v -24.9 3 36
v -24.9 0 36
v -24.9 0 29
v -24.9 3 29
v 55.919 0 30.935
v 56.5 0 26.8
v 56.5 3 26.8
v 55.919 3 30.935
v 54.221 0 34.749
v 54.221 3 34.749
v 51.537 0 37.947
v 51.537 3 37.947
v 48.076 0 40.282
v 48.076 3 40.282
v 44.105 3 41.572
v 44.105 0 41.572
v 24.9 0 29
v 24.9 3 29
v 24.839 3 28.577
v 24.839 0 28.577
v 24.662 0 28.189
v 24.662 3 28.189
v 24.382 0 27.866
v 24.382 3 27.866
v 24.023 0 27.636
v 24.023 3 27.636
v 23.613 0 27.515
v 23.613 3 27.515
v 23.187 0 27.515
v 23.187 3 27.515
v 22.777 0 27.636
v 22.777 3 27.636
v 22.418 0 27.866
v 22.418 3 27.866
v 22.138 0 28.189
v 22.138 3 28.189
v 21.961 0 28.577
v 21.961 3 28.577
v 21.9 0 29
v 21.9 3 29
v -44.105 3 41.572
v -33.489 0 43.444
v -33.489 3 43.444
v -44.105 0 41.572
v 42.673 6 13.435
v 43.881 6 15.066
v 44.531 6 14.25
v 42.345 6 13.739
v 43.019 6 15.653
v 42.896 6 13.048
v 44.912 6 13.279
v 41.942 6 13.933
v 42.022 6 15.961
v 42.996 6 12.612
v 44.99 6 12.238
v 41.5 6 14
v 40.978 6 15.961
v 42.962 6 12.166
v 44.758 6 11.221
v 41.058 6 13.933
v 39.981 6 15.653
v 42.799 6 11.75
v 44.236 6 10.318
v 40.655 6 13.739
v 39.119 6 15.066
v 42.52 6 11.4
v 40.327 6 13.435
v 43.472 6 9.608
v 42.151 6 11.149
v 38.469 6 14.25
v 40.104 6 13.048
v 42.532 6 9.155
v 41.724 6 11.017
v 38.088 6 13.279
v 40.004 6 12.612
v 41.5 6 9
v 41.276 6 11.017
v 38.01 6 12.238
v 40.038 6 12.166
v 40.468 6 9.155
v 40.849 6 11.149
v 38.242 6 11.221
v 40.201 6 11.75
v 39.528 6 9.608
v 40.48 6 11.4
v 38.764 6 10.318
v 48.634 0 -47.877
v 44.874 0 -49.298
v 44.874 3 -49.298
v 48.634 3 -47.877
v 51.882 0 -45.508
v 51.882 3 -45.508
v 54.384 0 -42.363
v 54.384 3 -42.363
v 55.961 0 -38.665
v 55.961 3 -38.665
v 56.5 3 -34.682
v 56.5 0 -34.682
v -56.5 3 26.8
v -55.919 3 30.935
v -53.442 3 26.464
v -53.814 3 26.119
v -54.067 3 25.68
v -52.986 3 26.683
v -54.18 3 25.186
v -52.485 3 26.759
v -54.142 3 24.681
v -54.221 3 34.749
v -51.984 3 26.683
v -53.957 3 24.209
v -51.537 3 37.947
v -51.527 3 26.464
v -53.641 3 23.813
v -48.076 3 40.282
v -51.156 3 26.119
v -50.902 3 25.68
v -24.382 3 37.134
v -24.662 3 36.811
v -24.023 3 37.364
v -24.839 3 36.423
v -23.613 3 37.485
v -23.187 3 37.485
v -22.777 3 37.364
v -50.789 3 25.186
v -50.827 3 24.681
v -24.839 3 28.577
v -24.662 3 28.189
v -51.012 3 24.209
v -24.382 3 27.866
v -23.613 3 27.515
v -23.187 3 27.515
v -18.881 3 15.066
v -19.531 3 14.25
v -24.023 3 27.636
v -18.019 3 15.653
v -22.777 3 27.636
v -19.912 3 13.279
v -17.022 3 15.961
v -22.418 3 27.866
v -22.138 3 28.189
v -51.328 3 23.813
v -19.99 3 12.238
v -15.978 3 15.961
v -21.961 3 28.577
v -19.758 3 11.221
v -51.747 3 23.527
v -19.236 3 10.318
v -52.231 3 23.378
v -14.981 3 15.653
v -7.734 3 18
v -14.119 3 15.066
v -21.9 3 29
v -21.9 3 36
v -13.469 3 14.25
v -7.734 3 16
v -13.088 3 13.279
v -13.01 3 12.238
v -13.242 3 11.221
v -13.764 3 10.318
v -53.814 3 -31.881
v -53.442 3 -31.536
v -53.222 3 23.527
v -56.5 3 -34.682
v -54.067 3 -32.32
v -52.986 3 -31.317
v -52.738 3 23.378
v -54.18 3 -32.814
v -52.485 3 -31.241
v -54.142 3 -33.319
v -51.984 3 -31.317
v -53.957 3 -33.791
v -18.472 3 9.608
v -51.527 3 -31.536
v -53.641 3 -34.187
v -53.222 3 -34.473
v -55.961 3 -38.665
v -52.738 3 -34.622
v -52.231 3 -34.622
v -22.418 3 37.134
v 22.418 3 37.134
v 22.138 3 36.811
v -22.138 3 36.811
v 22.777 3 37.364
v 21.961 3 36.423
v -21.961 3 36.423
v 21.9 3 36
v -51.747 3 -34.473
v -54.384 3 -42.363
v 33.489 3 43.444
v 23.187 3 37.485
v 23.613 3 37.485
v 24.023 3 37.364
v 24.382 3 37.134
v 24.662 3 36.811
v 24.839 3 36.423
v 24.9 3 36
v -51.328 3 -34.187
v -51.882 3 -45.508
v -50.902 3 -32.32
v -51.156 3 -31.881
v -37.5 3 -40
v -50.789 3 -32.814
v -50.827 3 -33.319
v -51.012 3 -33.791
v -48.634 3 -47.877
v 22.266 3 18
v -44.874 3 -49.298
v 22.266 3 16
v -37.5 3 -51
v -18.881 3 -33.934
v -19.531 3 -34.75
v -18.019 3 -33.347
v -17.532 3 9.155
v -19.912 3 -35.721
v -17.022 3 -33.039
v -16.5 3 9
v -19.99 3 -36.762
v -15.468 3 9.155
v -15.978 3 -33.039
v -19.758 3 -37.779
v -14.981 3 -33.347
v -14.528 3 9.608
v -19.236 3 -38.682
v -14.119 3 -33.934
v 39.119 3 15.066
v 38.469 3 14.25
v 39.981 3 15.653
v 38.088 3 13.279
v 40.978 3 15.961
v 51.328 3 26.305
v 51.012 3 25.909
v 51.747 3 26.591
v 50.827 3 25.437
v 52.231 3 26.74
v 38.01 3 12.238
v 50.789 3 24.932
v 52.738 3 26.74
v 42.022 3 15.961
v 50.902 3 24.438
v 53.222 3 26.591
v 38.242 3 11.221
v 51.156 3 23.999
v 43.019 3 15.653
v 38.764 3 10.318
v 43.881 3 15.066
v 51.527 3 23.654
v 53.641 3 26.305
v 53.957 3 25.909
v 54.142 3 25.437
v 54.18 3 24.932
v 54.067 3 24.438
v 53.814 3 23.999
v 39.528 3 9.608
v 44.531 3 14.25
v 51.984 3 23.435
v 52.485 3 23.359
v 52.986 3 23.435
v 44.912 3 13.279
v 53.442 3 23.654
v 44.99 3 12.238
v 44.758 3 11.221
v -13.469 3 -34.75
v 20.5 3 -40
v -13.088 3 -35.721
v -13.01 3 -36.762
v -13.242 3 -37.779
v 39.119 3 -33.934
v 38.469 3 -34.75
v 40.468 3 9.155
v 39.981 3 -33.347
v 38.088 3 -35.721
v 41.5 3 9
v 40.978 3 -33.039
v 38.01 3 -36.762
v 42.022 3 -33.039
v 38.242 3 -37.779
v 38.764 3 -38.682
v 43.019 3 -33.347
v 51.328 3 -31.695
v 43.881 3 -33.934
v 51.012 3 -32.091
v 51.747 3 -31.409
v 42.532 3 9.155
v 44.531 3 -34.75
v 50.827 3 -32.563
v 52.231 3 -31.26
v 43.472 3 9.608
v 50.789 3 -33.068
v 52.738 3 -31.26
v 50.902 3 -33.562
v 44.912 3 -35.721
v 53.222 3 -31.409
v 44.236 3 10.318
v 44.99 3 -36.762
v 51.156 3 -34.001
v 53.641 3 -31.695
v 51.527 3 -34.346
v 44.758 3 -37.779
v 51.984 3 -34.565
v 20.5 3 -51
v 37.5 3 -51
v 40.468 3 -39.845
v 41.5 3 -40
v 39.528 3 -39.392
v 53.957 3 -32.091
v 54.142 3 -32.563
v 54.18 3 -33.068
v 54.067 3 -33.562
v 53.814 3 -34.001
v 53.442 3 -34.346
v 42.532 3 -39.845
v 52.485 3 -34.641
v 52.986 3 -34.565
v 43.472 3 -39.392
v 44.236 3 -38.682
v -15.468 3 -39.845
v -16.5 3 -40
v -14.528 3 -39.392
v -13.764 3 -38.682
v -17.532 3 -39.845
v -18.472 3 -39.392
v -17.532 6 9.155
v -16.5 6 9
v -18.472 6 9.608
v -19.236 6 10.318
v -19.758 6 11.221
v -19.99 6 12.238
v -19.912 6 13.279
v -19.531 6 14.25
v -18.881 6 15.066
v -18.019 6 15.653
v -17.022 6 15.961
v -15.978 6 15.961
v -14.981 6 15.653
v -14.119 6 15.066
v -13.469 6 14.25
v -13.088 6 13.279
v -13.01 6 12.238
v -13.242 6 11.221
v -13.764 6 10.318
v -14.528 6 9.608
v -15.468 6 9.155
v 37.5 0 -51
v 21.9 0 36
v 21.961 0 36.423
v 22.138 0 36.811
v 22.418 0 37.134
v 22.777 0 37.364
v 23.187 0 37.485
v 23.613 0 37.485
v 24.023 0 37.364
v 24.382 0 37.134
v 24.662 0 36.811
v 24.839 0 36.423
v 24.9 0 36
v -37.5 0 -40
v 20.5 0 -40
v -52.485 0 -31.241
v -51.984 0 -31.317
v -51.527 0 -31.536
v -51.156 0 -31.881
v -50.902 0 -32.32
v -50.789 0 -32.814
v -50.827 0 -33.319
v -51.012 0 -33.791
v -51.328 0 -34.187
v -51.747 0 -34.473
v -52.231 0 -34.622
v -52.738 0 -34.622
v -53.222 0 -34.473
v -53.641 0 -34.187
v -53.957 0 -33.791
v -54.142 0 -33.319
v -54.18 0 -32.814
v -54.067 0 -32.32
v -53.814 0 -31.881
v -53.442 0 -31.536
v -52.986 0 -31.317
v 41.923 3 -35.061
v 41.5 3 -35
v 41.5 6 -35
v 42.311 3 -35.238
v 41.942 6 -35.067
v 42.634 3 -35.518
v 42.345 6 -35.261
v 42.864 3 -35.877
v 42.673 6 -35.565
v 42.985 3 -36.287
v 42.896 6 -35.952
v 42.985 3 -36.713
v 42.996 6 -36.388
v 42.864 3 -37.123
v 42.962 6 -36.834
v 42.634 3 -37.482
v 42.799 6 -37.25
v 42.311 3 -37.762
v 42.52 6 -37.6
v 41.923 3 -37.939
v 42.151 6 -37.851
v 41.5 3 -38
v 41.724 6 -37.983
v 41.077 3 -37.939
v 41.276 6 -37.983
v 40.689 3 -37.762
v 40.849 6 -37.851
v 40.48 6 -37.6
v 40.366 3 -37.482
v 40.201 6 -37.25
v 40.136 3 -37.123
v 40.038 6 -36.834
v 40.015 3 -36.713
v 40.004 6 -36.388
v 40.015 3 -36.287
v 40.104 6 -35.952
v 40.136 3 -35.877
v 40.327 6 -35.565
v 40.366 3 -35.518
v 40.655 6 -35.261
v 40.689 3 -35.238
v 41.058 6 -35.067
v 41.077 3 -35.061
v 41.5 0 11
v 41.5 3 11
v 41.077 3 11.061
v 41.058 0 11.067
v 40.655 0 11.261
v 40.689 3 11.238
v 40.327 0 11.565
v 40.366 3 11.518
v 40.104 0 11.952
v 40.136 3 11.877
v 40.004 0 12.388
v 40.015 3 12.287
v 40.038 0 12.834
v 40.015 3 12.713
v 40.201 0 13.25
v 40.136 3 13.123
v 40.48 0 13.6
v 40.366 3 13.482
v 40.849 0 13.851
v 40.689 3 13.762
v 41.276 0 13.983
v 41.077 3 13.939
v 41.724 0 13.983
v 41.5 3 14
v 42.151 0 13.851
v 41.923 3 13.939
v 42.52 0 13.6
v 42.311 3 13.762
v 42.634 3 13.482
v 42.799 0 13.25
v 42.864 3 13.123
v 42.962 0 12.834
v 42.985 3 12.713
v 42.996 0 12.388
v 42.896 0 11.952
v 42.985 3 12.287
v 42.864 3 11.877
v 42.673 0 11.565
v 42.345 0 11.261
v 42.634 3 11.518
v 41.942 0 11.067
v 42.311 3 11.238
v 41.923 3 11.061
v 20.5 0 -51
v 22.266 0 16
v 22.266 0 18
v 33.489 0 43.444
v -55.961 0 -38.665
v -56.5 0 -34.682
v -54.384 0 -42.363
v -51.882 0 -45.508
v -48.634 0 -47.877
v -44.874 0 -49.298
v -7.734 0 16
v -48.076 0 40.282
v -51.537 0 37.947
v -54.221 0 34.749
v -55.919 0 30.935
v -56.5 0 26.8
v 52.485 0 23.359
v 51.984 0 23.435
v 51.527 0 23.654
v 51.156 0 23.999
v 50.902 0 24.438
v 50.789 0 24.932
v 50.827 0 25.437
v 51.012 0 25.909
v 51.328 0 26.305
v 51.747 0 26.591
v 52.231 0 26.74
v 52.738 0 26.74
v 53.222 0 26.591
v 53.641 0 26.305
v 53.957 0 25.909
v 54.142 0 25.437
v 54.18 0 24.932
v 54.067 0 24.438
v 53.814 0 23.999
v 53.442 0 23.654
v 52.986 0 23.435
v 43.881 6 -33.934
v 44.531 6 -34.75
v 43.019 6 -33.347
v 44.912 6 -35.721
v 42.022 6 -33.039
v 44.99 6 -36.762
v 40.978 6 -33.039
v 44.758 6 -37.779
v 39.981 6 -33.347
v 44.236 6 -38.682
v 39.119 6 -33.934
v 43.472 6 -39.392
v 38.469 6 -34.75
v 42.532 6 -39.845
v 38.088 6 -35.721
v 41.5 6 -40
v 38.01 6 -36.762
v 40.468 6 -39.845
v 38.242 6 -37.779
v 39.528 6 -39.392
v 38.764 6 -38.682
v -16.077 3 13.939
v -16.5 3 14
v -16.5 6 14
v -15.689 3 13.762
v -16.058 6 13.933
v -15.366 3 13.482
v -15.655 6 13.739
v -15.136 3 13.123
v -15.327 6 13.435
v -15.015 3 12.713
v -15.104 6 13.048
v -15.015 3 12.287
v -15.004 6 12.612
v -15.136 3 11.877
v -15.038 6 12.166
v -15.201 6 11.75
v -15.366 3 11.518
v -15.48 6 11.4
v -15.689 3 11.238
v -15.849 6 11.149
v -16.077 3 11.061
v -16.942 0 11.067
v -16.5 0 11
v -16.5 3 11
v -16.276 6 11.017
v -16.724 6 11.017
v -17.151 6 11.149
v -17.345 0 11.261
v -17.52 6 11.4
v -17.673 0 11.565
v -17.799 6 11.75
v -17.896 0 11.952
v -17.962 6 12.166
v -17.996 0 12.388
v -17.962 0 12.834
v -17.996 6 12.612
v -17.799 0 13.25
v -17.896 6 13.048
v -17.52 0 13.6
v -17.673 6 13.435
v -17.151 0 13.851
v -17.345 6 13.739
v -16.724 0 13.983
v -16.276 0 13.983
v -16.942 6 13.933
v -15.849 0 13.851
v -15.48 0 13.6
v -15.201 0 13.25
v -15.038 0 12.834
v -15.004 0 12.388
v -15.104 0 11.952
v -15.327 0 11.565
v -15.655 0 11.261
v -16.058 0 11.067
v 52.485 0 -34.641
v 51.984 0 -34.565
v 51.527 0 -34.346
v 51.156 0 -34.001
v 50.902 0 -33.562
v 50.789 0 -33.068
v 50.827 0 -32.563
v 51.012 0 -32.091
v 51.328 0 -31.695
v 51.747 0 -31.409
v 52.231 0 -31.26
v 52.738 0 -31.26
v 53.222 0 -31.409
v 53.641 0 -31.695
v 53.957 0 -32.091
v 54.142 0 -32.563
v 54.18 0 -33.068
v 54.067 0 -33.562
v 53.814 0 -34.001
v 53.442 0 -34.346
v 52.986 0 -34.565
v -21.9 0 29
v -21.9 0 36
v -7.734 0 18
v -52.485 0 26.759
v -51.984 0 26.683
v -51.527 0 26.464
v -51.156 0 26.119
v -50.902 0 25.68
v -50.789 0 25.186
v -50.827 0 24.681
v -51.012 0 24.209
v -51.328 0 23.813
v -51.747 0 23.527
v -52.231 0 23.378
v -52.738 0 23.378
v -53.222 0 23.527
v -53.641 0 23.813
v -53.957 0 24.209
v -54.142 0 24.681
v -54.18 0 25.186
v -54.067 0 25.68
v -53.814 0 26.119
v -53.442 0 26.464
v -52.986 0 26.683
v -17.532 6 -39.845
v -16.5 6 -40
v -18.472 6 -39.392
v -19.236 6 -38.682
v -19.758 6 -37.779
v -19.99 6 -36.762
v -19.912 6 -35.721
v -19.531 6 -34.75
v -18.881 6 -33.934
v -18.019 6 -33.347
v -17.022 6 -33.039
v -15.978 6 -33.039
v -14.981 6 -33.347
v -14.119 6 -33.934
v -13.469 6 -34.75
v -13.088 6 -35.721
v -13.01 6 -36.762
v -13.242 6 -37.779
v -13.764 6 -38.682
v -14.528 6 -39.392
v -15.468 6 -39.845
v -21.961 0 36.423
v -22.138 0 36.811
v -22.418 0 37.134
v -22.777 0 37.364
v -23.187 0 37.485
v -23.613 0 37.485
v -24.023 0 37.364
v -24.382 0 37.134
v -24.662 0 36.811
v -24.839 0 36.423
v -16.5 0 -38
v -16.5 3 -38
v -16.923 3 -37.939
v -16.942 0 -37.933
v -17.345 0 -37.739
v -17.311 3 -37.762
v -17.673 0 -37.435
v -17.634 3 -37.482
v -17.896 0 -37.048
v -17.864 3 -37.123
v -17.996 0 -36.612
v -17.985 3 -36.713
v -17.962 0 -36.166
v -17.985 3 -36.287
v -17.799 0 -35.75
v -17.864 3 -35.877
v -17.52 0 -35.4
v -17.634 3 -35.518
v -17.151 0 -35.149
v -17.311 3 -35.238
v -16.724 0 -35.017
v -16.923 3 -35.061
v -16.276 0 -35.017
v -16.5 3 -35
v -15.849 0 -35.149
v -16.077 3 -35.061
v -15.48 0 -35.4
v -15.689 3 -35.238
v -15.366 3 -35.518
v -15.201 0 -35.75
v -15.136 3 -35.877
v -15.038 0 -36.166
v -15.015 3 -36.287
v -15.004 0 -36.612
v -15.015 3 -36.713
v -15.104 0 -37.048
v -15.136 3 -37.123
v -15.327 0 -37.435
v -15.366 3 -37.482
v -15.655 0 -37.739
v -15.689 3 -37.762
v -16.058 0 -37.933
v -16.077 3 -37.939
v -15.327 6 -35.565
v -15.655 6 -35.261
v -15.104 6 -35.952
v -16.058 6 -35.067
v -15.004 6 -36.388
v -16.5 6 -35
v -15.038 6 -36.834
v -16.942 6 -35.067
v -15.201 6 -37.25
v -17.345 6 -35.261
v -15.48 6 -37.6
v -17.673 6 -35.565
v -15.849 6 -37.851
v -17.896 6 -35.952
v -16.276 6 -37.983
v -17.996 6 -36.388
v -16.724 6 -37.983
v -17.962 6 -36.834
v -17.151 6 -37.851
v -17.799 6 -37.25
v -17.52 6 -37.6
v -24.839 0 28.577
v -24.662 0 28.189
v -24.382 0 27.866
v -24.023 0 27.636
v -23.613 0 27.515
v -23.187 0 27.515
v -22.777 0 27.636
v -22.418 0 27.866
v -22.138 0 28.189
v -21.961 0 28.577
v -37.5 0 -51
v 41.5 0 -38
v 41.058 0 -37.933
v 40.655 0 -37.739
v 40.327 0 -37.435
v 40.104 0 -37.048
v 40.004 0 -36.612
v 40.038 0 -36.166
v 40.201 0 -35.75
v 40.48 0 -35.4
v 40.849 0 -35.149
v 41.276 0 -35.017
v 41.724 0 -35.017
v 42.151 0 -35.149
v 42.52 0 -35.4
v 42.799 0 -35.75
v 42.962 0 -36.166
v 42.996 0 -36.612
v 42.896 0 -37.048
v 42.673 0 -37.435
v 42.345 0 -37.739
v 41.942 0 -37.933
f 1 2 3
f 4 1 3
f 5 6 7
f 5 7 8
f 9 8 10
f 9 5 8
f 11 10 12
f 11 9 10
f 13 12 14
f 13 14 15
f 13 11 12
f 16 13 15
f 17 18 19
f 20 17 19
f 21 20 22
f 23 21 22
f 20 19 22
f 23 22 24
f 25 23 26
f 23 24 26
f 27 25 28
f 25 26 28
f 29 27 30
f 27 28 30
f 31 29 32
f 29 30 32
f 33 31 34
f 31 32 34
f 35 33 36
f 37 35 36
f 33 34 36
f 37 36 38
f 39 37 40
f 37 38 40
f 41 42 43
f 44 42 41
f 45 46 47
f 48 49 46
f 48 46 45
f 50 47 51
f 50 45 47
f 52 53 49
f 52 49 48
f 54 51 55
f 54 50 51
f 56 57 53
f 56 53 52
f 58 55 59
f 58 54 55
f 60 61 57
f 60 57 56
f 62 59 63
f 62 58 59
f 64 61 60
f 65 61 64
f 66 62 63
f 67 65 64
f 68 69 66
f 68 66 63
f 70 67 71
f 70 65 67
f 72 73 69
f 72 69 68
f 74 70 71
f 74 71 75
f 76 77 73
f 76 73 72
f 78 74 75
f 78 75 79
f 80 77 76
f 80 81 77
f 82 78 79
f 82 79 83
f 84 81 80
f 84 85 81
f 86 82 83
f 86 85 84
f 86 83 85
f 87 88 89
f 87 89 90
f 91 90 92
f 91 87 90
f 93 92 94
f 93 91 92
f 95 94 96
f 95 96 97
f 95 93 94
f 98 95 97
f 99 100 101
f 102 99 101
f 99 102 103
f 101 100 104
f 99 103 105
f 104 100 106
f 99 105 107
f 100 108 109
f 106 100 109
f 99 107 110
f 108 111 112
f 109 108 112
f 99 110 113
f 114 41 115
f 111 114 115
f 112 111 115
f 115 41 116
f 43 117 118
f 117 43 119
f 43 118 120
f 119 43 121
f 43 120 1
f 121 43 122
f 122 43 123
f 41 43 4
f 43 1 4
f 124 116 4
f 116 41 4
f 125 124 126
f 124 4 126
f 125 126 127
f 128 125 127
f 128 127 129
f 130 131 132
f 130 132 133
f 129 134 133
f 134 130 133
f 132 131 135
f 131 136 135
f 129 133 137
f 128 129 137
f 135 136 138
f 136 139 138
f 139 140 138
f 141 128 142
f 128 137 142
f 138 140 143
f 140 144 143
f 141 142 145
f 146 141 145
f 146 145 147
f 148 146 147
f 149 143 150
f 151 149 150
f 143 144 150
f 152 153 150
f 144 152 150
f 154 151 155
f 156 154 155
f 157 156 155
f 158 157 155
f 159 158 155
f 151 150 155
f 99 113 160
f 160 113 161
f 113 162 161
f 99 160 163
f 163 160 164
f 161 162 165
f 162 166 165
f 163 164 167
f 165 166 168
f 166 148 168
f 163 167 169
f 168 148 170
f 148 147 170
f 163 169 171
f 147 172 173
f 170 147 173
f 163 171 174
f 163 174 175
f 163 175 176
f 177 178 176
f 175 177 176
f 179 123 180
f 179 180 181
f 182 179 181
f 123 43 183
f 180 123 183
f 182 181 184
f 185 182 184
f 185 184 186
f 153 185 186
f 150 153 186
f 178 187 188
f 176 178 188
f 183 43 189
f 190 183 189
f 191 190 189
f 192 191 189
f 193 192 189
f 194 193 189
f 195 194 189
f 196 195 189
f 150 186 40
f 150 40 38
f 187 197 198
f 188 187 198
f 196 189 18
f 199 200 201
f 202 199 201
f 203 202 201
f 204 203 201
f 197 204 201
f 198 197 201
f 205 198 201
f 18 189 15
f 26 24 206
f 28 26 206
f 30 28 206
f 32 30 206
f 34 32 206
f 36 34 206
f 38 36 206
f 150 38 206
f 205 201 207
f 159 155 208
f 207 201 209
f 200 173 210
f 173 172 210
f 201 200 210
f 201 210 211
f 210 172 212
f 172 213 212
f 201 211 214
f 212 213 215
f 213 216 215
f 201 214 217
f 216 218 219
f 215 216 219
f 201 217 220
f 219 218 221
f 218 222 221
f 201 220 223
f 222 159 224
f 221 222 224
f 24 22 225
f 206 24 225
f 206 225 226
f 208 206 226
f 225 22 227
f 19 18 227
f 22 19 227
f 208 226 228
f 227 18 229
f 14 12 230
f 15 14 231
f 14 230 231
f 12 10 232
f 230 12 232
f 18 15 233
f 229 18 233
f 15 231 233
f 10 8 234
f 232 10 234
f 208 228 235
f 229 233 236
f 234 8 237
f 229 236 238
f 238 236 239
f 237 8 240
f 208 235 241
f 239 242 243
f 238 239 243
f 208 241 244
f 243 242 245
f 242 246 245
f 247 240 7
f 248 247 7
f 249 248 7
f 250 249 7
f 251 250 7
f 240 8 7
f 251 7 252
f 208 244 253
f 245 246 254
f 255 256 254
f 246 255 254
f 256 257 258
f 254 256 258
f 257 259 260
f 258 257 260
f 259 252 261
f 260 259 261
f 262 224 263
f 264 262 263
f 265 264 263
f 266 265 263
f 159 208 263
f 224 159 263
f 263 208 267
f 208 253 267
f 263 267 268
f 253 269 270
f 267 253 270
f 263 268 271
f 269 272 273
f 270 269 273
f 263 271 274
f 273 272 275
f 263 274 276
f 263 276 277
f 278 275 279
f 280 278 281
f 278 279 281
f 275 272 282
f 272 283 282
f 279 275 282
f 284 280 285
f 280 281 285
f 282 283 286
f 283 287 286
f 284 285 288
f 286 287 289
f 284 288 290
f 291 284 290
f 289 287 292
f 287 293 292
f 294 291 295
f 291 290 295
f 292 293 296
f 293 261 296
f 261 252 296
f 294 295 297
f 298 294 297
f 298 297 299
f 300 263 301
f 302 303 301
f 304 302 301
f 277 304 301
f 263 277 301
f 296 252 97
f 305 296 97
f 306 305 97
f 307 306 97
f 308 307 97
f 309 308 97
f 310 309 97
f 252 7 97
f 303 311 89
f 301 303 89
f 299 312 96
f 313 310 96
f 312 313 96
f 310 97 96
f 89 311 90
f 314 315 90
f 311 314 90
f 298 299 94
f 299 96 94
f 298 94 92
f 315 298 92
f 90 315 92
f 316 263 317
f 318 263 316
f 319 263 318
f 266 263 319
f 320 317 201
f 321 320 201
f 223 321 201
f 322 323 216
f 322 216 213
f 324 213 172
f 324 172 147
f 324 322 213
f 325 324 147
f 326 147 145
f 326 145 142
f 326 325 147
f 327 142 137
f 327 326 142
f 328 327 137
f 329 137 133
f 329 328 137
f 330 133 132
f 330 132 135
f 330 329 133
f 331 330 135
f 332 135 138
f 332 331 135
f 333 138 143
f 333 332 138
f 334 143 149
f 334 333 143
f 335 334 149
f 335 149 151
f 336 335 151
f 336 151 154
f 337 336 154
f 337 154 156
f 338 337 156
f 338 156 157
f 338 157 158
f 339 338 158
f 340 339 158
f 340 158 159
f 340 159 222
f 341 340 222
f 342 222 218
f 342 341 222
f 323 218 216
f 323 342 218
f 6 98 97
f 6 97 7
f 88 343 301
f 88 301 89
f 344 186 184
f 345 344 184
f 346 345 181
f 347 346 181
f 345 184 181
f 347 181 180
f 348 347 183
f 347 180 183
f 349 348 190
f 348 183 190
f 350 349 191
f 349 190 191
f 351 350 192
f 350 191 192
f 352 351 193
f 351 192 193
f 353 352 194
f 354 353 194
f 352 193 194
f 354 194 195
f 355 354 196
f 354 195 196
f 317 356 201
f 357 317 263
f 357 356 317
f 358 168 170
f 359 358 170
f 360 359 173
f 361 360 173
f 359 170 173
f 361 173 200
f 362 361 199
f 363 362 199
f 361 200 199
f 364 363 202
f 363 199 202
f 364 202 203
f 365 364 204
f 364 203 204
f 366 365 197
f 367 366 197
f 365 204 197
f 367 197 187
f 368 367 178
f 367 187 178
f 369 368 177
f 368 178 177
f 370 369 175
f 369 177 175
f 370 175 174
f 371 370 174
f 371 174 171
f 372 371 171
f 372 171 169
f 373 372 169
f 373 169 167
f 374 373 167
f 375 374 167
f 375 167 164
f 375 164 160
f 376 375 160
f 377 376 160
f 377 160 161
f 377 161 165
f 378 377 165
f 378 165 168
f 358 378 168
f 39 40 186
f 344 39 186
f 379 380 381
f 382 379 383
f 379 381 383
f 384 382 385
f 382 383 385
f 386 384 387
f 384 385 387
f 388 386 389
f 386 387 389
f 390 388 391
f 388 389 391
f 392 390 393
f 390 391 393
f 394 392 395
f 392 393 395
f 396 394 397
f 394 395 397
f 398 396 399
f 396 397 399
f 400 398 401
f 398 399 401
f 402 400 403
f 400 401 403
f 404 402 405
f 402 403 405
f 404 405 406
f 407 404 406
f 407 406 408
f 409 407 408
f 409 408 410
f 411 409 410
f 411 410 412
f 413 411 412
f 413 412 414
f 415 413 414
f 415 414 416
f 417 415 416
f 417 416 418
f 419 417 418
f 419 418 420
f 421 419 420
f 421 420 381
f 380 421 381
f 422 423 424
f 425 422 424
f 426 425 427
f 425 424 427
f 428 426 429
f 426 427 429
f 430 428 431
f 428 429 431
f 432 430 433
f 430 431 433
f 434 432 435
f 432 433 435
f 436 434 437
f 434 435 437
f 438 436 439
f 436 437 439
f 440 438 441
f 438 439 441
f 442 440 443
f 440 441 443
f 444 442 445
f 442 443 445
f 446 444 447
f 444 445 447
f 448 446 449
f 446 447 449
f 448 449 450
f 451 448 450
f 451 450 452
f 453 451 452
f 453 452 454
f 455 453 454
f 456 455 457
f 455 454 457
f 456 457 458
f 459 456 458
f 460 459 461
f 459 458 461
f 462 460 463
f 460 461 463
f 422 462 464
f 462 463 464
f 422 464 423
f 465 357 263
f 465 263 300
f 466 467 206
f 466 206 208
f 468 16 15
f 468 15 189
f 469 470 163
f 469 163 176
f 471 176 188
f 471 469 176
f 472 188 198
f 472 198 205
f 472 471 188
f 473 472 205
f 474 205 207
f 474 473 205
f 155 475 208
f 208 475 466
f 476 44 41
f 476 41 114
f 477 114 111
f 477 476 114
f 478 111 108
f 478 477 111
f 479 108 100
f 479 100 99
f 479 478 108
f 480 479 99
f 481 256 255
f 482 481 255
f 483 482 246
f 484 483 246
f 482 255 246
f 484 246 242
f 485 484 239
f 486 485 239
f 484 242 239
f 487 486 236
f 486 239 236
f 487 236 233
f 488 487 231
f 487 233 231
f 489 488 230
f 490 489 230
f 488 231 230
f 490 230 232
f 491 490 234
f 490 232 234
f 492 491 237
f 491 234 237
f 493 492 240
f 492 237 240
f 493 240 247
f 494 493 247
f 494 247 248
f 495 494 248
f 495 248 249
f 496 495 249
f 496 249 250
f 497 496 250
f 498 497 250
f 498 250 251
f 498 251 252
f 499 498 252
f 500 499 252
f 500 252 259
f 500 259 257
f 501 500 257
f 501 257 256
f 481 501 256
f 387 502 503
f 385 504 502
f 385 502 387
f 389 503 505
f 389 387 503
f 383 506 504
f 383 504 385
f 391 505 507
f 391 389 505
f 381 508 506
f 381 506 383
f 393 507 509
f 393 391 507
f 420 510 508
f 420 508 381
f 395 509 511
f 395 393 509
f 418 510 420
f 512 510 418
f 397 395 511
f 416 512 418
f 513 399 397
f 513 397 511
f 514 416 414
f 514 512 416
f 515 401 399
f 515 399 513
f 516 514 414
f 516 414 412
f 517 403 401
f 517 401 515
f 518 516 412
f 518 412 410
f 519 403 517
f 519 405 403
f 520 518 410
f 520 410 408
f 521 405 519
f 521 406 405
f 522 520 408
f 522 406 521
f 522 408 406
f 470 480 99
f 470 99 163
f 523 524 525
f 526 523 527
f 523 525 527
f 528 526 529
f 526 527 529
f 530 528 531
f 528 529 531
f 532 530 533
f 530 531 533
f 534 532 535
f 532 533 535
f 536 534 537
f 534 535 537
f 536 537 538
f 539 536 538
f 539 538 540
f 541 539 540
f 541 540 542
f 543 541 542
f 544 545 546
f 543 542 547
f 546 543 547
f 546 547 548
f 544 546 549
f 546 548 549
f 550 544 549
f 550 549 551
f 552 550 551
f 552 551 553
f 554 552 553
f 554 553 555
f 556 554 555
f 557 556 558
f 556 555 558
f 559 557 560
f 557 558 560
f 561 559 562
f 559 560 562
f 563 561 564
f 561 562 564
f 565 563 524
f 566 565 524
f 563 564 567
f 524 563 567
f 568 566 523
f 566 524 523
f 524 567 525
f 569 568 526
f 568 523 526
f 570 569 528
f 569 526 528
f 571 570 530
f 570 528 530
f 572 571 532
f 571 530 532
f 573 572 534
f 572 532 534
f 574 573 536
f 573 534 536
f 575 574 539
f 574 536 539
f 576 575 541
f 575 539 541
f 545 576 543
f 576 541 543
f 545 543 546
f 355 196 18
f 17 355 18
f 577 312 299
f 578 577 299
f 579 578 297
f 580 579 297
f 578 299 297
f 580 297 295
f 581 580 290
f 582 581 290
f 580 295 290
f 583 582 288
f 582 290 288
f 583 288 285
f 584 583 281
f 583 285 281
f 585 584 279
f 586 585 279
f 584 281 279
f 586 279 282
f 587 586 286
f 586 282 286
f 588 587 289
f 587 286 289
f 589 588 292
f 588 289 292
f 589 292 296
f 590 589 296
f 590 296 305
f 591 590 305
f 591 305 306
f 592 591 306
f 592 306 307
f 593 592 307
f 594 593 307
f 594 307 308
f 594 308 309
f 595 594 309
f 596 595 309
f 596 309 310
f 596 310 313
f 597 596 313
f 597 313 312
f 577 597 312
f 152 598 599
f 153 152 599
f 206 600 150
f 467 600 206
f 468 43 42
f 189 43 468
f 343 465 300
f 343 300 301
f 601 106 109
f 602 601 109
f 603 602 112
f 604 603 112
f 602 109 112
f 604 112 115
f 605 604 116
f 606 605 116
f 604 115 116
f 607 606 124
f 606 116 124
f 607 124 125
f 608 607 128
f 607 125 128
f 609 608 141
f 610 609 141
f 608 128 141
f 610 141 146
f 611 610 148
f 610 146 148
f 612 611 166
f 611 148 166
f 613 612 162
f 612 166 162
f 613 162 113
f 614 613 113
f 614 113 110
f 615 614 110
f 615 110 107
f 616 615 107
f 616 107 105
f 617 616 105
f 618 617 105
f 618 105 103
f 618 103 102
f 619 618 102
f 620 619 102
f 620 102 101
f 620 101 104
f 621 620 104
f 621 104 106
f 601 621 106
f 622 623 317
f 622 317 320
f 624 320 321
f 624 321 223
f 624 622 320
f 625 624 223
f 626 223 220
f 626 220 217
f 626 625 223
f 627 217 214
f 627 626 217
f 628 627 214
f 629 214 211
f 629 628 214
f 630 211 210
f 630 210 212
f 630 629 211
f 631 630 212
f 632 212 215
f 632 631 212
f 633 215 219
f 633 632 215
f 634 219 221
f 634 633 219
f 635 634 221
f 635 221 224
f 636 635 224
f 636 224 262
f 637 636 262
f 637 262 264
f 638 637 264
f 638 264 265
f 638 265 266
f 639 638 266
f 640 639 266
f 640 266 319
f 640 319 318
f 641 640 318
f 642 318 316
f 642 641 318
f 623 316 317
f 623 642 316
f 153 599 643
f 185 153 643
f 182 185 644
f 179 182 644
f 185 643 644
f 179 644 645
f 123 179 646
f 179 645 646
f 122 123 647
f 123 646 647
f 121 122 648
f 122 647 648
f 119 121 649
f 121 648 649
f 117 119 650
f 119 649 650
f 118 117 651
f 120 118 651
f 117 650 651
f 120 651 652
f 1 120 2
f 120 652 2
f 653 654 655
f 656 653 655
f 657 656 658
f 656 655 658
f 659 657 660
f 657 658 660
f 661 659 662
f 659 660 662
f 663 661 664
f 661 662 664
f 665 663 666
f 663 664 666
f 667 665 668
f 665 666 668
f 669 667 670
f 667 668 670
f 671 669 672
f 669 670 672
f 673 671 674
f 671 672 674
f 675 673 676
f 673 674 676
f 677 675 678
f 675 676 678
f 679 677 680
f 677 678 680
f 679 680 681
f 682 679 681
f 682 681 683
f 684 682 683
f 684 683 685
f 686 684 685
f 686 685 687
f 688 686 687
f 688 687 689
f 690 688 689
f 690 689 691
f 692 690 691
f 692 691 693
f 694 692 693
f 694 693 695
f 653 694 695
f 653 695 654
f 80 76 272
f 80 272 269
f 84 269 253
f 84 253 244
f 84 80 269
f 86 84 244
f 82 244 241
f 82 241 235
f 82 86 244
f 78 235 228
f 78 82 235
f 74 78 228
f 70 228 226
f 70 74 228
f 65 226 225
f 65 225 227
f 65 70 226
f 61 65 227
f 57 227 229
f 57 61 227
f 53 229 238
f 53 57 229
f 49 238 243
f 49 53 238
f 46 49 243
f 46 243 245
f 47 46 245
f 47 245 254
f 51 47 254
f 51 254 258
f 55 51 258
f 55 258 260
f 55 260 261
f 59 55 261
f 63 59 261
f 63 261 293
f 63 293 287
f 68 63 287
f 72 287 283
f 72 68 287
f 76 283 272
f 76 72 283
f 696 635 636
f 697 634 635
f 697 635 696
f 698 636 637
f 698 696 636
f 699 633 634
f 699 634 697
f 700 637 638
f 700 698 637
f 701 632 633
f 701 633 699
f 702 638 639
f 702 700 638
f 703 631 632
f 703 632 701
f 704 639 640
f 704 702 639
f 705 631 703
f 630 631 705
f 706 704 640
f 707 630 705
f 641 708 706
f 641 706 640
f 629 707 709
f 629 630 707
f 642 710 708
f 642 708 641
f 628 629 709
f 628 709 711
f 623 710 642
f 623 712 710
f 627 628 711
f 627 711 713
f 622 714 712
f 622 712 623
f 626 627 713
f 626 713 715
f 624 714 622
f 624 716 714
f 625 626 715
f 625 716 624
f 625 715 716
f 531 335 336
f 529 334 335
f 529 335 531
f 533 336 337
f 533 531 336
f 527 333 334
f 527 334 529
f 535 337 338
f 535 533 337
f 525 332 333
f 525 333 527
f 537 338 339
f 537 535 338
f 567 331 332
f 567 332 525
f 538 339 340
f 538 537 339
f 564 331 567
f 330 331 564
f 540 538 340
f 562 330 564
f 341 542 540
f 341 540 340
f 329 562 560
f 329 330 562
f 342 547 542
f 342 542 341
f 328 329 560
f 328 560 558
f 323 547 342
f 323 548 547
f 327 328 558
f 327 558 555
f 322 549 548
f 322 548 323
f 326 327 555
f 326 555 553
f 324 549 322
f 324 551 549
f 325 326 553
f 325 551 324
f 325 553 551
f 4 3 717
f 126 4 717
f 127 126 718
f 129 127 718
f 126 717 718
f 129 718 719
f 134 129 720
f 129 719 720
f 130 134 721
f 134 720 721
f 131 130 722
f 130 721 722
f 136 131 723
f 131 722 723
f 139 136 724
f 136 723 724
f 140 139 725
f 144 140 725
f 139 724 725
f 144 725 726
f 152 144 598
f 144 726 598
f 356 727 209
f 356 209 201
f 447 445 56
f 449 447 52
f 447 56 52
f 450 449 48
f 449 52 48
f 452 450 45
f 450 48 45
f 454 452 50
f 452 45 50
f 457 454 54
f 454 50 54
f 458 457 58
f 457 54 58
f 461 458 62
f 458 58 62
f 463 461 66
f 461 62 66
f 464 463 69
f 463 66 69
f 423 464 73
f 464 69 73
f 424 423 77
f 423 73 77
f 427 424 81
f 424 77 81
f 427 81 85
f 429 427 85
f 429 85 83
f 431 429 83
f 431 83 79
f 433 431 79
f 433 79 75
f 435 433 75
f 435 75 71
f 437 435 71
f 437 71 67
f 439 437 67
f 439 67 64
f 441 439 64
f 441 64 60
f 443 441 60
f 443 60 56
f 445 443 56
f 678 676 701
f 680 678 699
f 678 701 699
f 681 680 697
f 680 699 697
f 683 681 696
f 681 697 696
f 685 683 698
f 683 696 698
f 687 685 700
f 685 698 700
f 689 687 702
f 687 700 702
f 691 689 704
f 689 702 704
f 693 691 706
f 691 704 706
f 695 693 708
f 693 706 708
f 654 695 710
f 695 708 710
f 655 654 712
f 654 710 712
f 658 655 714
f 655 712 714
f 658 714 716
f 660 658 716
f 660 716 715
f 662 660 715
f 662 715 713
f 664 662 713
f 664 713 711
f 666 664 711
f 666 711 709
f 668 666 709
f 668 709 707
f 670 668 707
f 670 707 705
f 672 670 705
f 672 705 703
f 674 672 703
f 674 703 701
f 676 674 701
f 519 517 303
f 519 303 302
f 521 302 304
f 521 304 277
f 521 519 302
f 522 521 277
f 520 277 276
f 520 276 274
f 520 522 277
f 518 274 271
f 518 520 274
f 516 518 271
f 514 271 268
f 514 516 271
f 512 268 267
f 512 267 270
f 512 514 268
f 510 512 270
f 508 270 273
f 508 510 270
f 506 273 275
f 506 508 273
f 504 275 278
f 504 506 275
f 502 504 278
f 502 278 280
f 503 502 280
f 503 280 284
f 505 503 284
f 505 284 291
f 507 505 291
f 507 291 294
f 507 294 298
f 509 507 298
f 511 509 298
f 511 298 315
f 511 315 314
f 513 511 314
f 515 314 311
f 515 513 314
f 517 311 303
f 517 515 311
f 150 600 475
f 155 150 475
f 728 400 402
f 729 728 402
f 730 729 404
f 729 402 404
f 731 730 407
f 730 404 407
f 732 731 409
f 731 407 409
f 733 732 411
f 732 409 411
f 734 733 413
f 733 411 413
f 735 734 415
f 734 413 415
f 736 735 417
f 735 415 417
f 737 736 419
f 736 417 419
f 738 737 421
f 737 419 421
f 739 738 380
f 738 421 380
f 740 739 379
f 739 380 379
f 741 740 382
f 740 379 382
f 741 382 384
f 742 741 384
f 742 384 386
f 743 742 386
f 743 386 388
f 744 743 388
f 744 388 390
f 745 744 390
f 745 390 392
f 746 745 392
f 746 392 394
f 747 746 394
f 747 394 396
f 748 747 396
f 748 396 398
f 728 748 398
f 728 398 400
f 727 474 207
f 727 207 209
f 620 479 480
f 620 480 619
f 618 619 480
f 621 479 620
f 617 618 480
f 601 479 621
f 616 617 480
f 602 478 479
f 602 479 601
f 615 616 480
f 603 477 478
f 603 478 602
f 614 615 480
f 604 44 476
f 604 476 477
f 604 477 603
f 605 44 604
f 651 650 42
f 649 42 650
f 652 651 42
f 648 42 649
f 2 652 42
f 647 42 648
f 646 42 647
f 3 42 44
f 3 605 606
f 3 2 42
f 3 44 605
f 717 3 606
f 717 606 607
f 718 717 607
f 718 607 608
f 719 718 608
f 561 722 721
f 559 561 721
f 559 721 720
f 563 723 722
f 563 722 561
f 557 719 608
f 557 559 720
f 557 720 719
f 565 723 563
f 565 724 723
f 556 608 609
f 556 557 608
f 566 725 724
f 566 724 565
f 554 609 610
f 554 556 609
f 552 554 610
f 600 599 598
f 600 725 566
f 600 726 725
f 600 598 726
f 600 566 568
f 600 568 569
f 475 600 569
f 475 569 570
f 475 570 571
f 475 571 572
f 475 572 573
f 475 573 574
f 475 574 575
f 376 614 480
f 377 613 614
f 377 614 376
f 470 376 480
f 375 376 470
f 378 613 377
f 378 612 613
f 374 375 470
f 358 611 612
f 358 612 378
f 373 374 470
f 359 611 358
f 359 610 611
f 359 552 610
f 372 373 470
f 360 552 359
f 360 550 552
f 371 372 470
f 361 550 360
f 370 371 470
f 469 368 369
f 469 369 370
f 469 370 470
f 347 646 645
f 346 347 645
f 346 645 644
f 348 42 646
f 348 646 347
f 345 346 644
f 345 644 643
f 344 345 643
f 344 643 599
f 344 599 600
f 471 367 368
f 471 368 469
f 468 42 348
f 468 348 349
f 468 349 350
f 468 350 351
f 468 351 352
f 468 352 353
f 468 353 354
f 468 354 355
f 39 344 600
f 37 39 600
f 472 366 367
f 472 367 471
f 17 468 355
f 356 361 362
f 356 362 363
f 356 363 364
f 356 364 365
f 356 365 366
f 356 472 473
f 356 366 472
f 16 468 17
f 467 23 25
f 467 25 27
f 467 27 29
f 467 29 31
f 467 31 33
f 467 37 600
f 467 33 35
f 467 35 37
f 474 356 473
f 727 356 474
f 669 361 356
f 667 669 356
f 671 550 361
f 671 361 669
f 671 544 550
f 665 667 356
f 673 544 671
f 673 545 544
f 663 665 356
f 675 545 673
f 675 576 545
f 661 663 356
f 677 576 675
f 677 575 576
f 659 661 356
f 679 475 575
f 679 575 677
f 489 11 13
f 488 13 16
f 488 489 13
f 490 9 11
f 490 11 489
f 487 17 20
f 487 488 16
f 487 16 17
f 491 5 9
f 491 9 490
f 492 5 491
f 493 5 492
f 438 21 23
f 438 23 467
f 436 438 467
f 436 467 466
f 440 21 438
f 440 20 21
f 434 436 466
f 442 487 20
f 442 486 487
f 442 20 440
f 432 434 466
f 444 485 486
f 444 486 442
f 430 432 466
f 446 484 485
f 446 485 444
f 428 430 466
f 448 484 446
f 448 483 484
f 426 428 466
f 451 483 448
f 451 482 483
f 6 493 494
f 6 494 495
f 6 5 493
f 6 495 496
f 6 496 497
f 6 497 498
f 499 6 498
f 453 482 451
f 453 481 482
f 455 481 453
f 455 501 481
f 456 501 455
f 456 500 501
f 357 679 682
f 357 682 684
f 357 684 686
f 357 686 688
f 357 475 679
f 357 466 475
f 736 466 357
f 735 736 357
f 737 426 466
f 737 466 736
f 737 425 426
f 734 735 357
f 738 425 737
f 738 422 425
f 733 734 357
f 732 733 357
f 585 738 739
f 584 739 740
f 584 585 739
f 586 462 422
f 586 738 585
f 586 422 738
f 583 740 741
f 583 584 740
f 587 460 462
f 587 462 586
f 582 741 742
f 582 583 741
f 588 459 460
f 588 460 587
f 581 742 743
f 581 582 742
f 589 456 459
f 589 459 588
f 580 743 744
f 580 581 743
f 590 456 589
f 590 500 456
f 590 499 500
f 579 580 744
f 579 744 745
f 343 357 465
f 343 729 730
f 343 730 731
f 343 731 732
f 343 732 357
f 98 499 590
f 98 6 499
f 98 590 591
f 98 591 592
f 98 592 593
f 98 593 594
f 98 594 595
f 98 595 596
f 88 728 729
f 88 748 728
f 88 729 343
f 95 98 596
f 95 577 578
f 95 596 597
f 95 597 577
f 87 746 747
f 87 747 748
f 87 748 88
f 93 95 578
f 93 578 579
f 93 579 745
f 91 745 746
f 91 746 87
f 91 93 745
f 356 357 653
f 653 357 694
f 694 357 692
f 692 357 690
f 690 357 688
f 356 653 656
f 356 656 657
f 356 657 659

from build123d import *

# Parameters (mm, degrees)
BOSS_EXTRU_1_DEPTH       = 3
CONG_1_R                 = 20
CONG_2_R                 = 5
BOSS_EXTRU_2_DEPTH       = 5
CONG_4_R                 = 2
CONG_5_R                 = 4
ESQUISSE3_R              = 1.5
ENL_V_MAT_EXTRU_2_DEPTH  = 25
ESQUISSE4_R              = 1.7
ENL_V_MAT_EXTRU_3_DEPTH  = 25
ESQUISSE5_R              = 1.7
ENL_V_MAT_EXTRU_4_DEPTH  = 10
ESQUISSE6_R              = 1.7
ENL_V_MAT_EXTRU_5_DEPTH  = 10
CONG_6_R                 = 10
ENL_V_MAT_EXTRU_8_DEPTH  = 10
ESQUISSE8_R              = 1.5
ESQUISSE8_W              = 30
ESQUISSE8_H              = 2
ENL_V_MAT_EXTRU_10_DEPTH = 10
BOSS_EXTRU_3_START       = 3
ESQUISSE8_3_R            = 3.5
ESQUISSE8_3_R_2          = 1.5
BOSS_EXTRU_3_DEPTH       = 3
ENL_V_MAT_EXTRU_11_DEPTH = 6.5


with BuildPart() as part:
    # Esquisse1 → Boss.-Extru.1 (new body)
    with BuildSketch(Plane(origin=(0, 0, 0), x_dir=(1, 0, 0), z_dir=(0, 1, 0))):
        with BuildLine():
            Line((-37.5, 95), (37.5, 95))
            Line((37.5, 95), (37.5, 51))
            Line((37.5, 51), (44.874265815, 49.29751659))
            ThreePointArc((44.874265815, 49.29751659), (53.239122353, 44.019685168), (56.5, 34.681965619))
            Line((56.5, 34.681965619), (56.5, -26.800001164))
            ThreePointArc((56.5, -26.800001164), (52.990666647, -36.441815309), (44.104722665, -41.572117459))
            Line((44.104722665, -41.572117459), (17, -46.351411369))
            Line((17, -46.351411369), (17, -61.9))
            Line((17, -61.9), (27, -61.9))
            Line((27, -61.9), (27, -66.9))
            Line((27, -66.9), (17, -66.9))
            Line((17, -66.9), (17, -79.1))
            Line((17, -79.1), (27, -79.1))
            Line((27, -79.1), (27, -84.1))
            Line((27, -84.1), (17, -84.1))
            Line((17, -84.1), (17, -95))
            Line((17, -95), (-17, -95))
            Line((-17, -95), (-17, -84.1))
            Line((-17, -84.1), (-27, -84.1))
            Line((-27, -84.1), (-27, -79.1))
            Line((-27, -79.1), (-17, -79.1))
            Line((-17, -79.1), (-17, -66.9))
            Line((-17, -66.9), (-27, -66.9))
            Line((-27, -66.9), (-27, -61.9))
            Line((-27, -61.9), (-17, -61.9))
            Line((-17, -61.9), (-17, -46.351411369))
            Line((-17, -46.351411369), (-44.104722665, -41.572117459))
            ThreePointArc((-44.104722665, -41.572117459), (-52.990666647, -36.441815309), (-56.5, -26.800001164))
            Line((-56.5, -26.800001164), (-56.5, 34.681965619))
            ThreePointArc((-56.5, 34.681965619), (-53.239122353, 44.019685168), (-44.874265815, 49.29751659))
            Line((-44.874265815, 49.29751659), (-37.5, 51))
            Line((-37.5, 51), (-37.5, 95))
        make_face()
    extrude(amount=BOSS_EXTRU_1_DEPTH)

    # Congé1
    # the kernel refuses this fillet: 20 mm, written as the material it adds along each edge
    with BuildSketch(Plane(origin=(17, 0, 46.351411369), x_dir=(0.9848077530122094, 0, -0.1736481776669235), z_dir=(0, 1, 0))) as cong_1_piece_1:
        with BuildLine():
            CenterArc((16.742910017, -20), CONG_1_R, 90, 76.444834731)
            Line((-2.699984081, -15.312370632), (-3.088841963, -15.218618044))
            ThreePointArc((-3.088841963, -15.218618044), (-1.743915142, -7.586726045), (-0.393923101, 0.069459271))
            Line((-0.393923101, 0.069459271), (0, 0.4))
            Line((0, 0.4), (16.742910017, 0.4))
            Line((16.742910017, 0.4), (16.742910017, 0))
        make_face()
    extrude(amount=3)
    with BuildSketch(Plane(origin=(-17, 0, 46.351411369), x_dir=(0, 0, 1), z_dir=(0, 1, 0))) as cong_1_piece_2:
        with BuildLine():
            CenterArc((16.788779247, -19.961511146), CONG_1_R, 93.555165269, 76.444834731)
            Line((-2.907375813, -16.488547593), (-3.301298915, -16.419088322))
            Line((-3.301298915, -16.419088322), (-0.393923101, 0.069459271))
            Line((-0.393923101, 0.069459271), (0, 0.4))
            ThreePointArc((0, 0.4), (7.774294315, 0.4), (15.523784818, 0.399230223))
            Line((15.523784818, 0.399230223), (15.548588631, 0))
        make_face()
    extrude(amount=3)

    # Congé2
    cong_2_edges = [part.edges().sort_by_distance(p)[0] for p in [
        (-17, 1.5, 61.9),
        (17, 1.5, 61.9),
    ]]
    fillet(cong_2_edges, radius=CONG_2_R)

    # Esquisse2 → Boss.-Extru.2 (add)
    with BuildSketch(Plane.XY.offset(84.1)):
        Polygon((-27, 5), (-27, 8.904402326), (-16.833134842, 8.904402326), (-14.427579086, 3), (-14.427579086, 0), (-27, 0), align=None)
        Polygon((16.833134842, 8.904402326), (14.427579086, 3), (14.427579086, 0), (27, 0), (27, 5), (27, 8.904402326), align=None)
    boss_extru_2 = extrude(amount=-BOSS_EXTRU_2_DEPTH)

    # Symétrie1: Boss.-Extru.2 across plane
    add(boss_extru_2.mirror(Plane.XY.offset(73)))

    # Congé4
    cong_4_edges = [part.edges().sort_by_distance(p)[0] for p in [
        (16.833134842, 8.904402326, 81.6),
        (14.427579086, 3, 81.6),
        (-16.833134842, 8.904402326, 81.6),
        (-14.427579086, 3, 81.6),
        (16.833134842, 8.904402326, 64.4),
        (14.427579086, 3, 64.4),
        (-14.427579086, 3, 64.4),
        (-16.833134842, 8.904402326, 64.4),
    ]]
    fillet(cong_4_edges, radius=CONG_4_R)

    # Congé5
    cong_5_edges = [part.edges().sort_by_distance(p)[0] for p in [
        (27, 8.904402326, 81.6),
        (-27, 8.904402326, 81.6),
        (27, 8.904402326, 64.4),
        (-27, 8.904402326, 64.4),
        (-27, 0, 64.4),
        (-27, 0, 81.6),
        (27, 0, 81.6),
        (27, 0, 64.4),
    ]]
    fillet(cong_5_edges, radius=CONG_5_R)

    # Esquisse3 → Enlèv. mat.-Extru.2 (cut)
    with BuildSketch(Plane.XY.offset(84.1)):
        with Locations((-22, 4.452201163)):
            Circle(ESQUISSE3_R)
        with Locations(Location((22, 4.452201163, 0), (0, 0, 284.503100137))):
            Circle(ESQUISSE3_R)
    extrude(amount=-ENL_V_MAT_EXTRU_2_DEPTH, mode=Mode.SUBTRACT)

    # Esquisse4 → Enlèv. mat.-Extru.3 (cut)
    with BuildSketch(Plane(origin=(0, 3, 0), x_dir=(1, 0, 0), z_dir=(0, 1, 0))):
        with Locations(Location((-10, -90.8, 0), (0, 0, 270))):
            Circle(ESQUISSE4_R)
        with Locations(Location((10, -90.8, 0), (0, 0, 270))):
            Circle(ESQUISSE4_R)
        with Locations(Location((8.90673672, -64.828011588, 0), (0, 0, 270))):
            Circle(ESQUISSE4_R)
        with Locations(Location((8.90673672, -81.171988412, 0), (0, 0, 270))):
            Circle(ESQUISSE4_R)
        with Locations(Location((-8.90673672, -81.171988412, 0), (0, 0, 270))):
            Circle(ESQUISSE4_R)
        with Locations(Location((-8.90673672, -64.828011588, 0), (0, 0, 270))):
            Circle(ESQUISSE4_R)
    extrude(amount=-ENL_V_MAT_EXTRU_3_DEPTH, mode=Mode.SUBTRACT)

    # Esquisse5 → Enlèv. mat.-Extru.4 (cut)
    with BuildSketch(Plane(origin=(0, 3, 0), x_dir=(1, 0, 0), z_dir=(0, 1, 0))):
        with Locations(Location((15.5, 83, 0), (0, 0, 270))):
            Circle(ESQUISSE5_R)
        with Locations(Location((15.5, 49, 0), (0, 0, 270))):
            Circle(ESQUISSE5_R)
        with Locations(Location((-13, 83, 0), (0, 0, 270))):
            Circle(ESQUISSE5_R)
        with Locations(Location((-13, 67, 0), (0, 0, 270))):
            Circle(ESQUISSE5_R)
        with Locations(Location((27.5, 80, 0), (0, 0, 270))):
            Circle(ESQUISSE5_R)
        with Locations(Location((27.5, 55, 0), (0, 0, 270))):
            Circle(ESQUISSE5_R)
        with Locations(Location((27.5, 89, 0), (0, 0, 270))):
            Circle(ESQUISSE5_R)
        with Locations(Location((-27.5, 89, 0), (0, 0, 270))):
            Circle(ESQUISSE5_R)
        with Locations(Location((-27.5, 80, 0), (0, 0, 270))):
            Circle(ESQUISSE5_R)
        with Locations(Location((-27.5, 55, 0), (0, 0, 270))):
            Circle(ESQUISSE5_R)
        with Locations(Location((0, 89, 0), (0, 0, 270))):
            Circle(ESQUISSE5_R)
    extrude(amount=-ENL_V_MAT_EXTRU_4_DEPTH, mode=Mode.SUBTRACT)

    # Esquisse6 → Enlèv. mat.-Extru.5 (cut)
    with BuildSketch(Plane(origin=(0, 3, 0), x_dir=(1, 0, 0), z_dir=(0, 1, 0))):
        with Locations(Location((-52.484739006, 32.940982227, 0), (0, 0, 270))):
            Circle(ESQUISSE6_R)
        with Locations(Location((-52.484739006, -25.059017773, 0), (0, 0, 270))):
            Circle(ESQUISSE6_R)
        with Locations(Location((52.484739006, -25.059017773, 0), (0, 0, 90))):
            Circle(ESQUISSE6_R)
        with Locations(Location((52.484739006, 32.940982227, 0), (0, 0, 90))):
            Circle(ESQUISSE6_R)
    extrude(amount=-ENL_V_MAT_EXTRU_5_DEPTH, mode=Mode.SUBTRACT)

    # Congé6
    cong_6_edges = [part.edges().sort_by_distance(p)[0] for p in [
        (37.5, 1.5, -95),
        (-37.5, 1.5, -95),
    ]]
    fillet(cong_6_edges, radius=CONG_6_R)

    # Esquisse7 → Enlèv. mat.-Extru.8 (cut, symmetric)
    with BuildSketch(Plane(origin=(0, 3, 0), x_dir=(1, 0, 0), z_dir=(0, 1, 0))):
        Polygon((-86.454887478, 51), (-37.5, 51), (-37.5, 40), (20.5, 40), (20.5, 51), (91.524772855, 51), (68.271042048, 103.22710764), (-47.050718145, 103.22710764), align=None)
        Polygon((-33.488547593, -43.444035556), (33.488547593, -43.444035556), (53.128015595, -56.162105977), (47.497778975, -107.906661581), (-41.245474419, -107.906661581), (-59.476716808, -77.074413423), align=None)
    extrude(amount=ENL_V_MAT_EXTRU_8_DEPTH, both=True, mode=Mode.SUBTRACT)

    # Esquisse8 → Enlèv. mat.-Extru.10 (cut, symmetric)
    with BuildSketch(Plane(origin=(0, 3, 0), x_dir=(1, 0, 0), z_dir=(0, 1, 0))):
        with Locations(Location((41.5, 36.5, 0), (0, 0, 90))):
            Circle(ESQUISSE8_R)
        with Locations((7.26572134, -17)):
            Rectangle(ESQUISSE8_W, ESQUISSE8_H)
        with Locations(Location((-16.5, -12.5, 0), (0, 0, 90))):
            Circle(ESQUISSE8_R)
        with Locations(Location((-16.5, 36.5, 0), (0, 0, 90))):
            Circle(ESQUISSE8_R)
        with Locations(Location((41.5, -12.5, 0), (0, 0, 90))):
            Circle(ESQUISSE8_R)
    extrude(amount=ENL_V_MAT_EXTRU_10_DEPTH, both=True, mode=Mode.SUBTRACT)

    # Esquisse8<3> → Boss.-Extru.3 (add)
    # profile 1 of 4: a face of its own
    with BuildSketch(Plane(origin=(0, 3, 0), x_dir=(1, 0, 0), z_dir=(0, 1, 0)).offset(BOSS_EXTRU_3_START)):
        with Locations(Location((-16.5, -12.5, 0), (0, 0, 90))):
            Circle(ESQUISSE8_3_R)
        with Locations(Location((-16.5, -12.5, 0), (0, 0, 270))):
            Circle(ESQUISSE8_3_R_2, mode=Mode.SUBTRACT)
    # profile 2 of 4: a face of its own
    with BuildSketch(Plane(origin=(0, 3, 0), x_dir=(1, 0, 0), z_dir=(0, 1, 0)).offset(BOSS_EXTRU_3_START)):
        with Locations(Location((41.5, -12.5, 0), (0, 0, 90))):
            Circle(ESQUISSE8_3_R)
        with Locations(Location((41.5, -12.5, 0), (0, 0, 270))):
            Circle(ESQUISSE8_3_R_2, mode=Mode.SUBTRACT)
    # profile 3 of 4: a face of its own
    with BuildSketch(Plane(origin=(0, 3, 0), x_dir=(1, 0, 0), z_dir=(0, 1, 0)).offset(BOSS_EXTRU_3_START)):
        with Locations(Location((41.5, 36.5, 0), (0, 0, 90))):
            Circle(ESQUISSE8_3_R)
        with Locations(Location((41.5, 36.5, 0), (0, 0, 270))):
            Circle(ESQUISSE8_3_R_2, mode=Mode.SUBTRACT)
    # profile 4 of 4: a face of its own
    with BuildSketch(Plane(origin=(0, 3, 0), x_dir=(1, 0, 0), z_dir=(0, 1, 0)).offset(BOSS_EXTRU_3_START)):
        with Locations(Location((-16.5, 36.5, 0), (0, 0, 90))):
            Circle(ESQUISSE8_3_R)
        with Locations(Location((-16.5, 36.5, 0), (0, 0, 270))):
            Circle(ESQUISSE8_3_R_2, mode=Mode.SUBTRACT)
    extrude(amount=-BOSS_EXTRU_3_DEPTH)

    # Esquisse10 → Enlèv. mat.-Extru.11 (cut, symmetric)
    with BuildSketch(Plane(origin=(0, 3, 0), x_dir=(1, 0, 0), z_dir=(0, 1, 0))):
        with BuildLine():
            Line((-24.9, -36), (-24.9, -29))
            ThreePointArc((-24.9, -29), (-23.4, -27.5), (-21.9, -29))
            Line((-21.9, -29), (-21.9, -36))
            ThreePointArc((-21.9, -36), (-23.4, -37.5), (-24.9, -36))
        make_face()
        with BuildLine():
            Line((24.9, -36), (24.9, -29))
            ThreePointArc((24.9, -29), (23.4, -27.5), (21.9, -29))
            Line((21.9, -29), (21.9, -36))
            ThreePointArc((21.9, -36), (23.4, -37.5), (24.9, -36))
        make_face()
    extrude(amount=ENL_V_MAT_EXTRU_11_DEPTH, both=True, mode=Mode.SUBTRACT)


solid = part.part
